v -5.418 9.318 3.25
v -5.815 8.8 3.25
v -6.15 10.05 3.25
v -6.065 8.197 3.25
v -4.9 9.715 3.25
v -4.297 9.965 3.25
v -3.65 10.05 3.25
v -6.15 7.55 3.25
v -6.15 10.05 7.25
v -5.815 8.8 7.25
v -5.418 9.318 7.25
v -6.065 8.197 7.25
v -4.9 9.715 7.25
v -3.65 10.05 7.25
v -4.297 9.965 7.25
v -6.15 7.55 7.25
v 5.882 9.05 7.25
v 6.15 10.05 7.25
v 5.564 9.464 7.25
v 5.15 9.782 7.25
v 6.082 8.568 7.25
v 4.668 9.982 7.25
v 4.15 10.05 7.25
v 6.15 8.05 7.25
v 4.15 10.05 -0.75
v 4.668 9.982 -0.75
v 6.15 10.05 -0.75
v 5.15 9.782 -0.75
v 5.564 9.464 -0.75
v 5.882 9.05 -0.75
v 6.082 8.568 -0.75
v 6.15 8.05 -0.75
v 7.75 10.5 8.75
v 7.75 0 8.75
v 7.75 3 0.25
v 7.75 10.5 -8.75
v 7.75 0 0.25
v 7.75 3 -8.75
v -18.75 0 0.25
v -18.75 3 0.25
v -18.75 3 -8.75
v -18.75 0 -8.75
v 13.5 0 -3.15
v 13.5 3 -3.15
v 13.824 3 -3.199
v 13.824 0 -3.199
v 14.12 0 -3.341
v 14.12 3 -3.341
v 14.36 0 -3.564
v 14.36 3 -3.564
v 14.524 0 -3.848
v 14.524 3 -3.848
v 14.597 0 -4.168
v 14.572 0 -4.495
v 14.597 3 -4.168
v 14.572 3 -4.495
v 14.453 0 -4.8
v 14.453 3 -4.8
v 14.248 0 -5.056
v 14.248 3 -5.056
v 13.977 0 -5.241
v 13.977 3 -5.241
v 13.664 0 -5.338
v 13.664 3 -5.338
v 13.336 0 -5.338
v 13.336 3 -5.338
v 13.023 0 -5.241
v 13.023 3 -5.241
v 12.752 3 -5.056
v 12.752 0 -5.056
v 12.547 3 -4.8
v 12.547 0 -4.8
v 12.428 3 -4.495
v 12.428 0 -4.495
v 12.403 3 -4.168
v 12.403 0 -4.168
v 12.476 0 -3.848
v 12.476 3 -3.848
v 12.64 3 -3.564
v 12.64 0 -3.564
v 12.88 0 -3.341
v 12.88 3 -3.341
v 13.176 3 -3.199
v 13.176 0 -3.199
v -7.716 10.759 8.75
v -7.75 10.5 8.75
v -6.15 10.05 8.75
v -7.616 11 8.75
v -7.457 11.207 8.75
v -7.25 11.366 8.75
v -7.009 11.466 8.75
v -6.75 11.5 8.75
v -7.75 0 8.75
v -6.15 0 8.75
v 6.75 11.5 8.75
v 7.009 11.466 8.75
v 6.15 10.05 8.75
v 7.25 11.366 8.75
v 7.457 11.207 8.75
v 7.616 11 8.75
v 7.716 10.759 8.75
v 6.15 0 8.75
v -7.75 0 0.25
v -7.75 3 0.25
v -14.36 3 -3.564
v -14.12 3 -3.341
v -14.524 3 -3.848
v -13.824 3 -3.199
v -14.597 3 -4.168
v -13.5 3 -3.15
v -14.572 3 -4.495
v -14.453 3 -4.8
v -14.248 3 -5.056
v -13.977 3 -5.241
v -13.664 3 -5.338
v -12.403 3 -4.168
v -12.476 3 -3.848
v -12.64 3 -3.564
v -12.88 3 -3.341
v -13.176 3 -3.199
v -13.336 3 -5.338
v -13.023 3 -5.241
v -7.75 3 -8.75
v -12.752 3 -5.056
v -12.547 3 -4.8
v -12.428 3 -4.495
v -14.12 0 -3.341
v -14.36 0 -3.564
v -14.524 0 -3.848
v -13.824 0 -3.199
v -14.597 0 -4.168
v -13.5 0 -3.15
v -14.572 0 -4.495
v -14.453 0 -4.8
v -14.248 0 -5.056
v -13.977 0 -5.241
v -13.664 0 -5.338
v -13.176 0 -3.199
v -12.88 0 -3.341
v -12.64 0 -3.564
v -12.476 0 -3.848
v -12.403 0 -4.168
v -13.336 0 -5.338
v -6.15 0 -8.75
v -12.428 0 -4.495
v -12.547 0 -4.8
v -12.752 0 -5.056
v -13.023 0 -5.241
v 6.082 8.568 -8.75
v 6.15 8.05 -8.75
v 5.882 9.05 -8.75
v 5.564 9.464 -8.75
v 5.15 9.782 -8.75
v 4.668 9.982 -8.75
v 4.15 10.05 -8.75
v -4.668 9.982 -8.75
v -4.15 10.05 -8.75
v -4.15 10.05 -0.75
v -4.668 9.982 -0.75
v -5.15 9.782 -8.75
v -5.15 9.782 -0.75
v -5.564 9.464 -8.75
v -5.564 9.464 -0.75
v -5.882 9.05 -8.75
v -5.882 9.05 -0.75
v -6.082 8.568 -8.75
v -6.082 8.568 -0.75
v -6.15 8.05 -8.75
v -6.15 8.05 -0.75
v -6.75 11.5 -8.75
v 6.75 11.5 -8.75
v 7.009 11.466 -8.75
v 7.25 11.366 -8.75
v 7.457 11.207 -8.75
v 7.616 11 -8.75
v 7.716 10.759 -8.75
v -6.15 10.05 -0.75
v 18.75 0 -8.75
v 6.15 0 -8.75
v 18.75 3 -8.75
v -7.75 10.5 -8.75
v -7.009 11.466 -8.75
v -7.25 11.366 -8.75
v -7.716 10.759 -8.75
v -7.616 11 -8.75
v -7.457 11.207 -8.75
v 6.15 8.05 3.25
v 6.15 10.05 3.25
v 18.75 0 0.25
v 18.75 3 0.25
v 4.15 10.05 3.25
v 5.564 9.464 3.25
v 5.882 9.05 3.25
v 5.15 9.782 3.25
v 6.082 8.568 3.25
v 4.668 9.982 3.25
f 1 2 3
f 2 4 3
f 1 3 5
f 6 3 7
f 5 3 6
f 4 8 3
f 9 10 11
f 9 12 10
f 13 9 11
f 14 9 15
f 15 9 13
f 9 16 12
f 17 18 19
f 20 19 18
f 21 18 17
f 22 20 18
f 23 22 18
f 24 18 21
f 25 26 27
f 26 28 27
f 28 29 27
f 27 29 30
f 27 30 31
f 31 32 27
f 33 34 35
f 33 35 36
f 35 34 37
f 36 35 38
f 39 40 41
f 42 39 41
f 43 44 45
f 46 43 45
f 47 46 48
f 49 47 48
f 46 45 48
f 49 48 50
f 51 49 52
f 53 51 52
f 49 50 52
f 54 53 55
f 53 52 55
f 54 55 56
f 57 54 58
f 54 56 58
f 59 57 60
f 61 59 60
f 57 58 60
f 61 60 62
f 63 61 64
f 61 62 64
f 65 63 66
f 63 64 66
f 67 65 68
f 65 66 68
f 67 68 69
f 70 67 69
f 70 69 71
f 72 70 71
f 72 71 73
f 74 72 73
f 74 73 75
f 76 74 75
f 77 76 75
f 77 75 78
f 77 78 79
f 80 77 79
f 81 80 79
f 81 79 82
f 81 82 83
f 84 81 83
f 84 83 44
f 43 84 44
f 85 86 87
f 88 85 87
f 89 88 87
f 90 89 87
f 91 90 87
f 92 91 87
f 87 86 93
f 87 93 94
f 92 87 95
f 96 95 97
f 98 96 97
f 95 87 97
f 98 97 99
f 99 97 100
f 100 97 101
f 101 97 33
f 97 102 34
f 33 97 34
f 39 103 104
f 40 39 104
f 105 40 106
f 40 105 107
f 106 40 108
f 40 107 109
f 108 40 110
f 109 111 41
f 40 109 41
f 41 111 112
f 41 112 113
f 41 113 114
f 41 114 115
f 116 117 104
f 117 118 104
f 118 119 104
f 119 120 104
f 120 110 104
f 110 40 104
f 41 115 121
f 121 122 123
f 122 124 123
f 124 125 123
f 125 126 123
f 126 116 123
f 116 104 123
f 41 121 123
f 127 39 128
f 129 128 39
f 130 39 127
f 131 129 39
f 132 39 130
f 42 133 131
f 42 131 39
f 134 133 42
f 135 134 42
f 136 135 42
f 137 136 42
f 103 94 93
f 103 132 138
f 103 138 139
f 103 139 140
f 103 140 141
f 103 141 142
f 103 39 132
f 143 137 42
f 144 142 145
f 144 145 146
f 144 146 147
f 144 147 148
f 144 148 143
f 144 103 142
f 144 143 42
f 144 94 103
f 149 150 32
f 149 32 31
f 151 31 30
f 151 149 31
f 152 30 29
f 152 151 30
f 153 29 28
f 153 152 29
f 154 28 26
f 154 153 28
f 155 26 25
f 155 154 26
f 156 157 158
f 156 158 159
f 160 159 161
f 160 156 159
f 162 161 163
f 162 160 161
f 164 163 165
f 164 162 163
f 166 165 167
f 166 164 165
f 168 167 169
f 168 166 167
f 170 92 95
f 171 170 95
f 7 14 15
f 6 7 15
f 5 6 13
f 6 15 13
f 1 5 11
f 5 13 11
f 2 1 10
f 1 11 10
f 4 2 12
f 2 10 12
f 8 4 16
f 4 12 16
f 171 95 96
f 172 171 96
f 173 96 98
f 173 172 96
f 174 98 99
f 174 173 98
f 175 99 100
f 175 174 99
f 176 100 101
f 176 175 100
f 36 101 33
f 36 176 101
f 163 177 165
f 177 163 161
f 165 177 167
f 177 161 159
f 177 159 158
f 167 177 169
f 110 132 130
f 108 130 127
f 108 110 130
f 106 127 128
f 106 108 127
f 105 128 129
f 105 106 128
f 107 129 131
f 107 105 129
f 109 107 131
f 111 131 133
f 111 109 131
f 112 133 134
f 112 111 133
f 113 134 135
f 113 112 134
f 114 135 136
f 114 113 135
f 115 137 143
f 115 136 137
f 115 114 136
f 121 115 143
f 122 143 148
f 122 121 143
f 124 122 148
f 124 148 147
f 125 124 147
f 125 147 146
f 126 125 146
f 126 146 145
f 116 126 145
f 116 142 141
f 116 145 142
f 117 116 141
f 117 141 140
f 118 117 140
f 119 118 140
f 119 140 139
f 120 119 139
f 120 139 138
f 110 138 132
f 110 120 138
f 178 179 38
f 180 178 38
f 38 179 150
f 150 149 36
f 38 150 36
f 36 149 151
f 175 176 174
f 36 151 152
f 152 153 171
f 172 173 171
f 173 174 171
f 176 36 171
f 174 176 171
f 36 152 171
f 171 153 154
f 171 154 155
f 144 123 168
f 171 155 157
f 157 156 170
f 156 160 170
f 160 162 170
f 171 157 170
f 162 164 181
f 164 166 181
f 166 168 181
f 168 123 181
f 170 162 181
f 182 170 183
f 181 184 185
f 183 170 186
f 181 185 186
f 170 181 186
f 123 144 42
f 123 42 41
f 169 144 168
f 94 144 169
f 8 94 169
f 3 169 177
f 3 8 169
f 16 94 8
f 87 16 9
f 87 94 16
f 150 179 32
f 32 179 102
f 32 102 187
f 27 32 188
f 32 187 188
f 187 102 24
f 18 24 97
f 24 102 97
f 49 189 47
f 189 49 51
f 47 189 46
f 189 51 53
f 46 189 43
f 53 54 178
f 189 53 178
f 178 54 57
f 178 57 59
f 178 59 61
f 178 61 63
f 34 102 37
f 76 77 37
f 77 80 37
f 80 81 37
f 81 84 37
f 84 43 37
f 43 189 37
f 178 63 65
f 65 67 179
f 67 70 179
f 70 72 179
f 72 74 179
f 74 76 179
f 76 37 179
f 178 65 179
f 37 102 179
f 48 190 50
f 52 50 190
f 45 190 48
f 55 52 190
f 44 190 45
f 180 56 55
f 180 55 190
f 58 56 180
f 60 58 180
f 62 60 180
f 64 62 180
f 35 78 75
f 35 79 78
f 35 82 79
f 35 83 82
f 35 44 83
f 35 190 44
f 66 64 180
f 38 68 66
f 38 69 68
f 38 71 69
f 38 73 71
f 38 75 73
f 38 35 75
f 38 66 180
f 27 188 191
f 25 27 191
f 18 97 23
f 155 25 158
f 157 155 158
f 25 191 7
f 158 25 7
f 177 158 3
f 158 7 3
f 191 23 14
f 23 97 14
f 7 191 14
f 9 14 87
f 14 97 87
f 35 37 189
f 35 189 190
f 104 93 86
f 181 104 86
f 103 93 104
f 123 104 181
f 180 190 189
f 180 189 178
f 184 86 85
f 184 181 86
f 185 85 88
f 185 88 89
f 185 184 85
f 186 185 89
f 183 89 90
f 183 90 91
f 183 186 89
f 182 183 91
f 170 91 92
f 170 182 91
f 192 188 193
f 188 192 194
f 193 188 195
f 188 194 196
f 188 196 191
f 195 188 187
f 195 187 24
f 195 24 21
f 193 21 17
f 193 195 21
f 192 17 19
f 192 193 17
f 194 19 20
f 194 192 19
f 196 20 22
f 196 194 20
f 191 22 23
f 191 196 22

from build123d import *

# Parameters (mm, degrees)
CROQUIS1_W               = 15.5
CROQUIS1_H               = 17.5
SALIENTE_EXTRUIR1_DEPTH  = 11.5
CROQUIS2_W               = 12.3
CROQUIS2_H               = 10.05
CORTAR_EXTRUIR1_DEPTH    = 23.328513161
REDONDEO1_R              = 1
CROQUIS3_W               = 9
CROQUIS3_H               = 3
SALIENTE_EXTRUIR4_DEPTH  = 11
CROQUIS12_R              = 1.1
CORTAR_EXTRUIR7_DEPTH    = 23.369063458
CROQUIS13_W              = 18.078388853
CROQUIS13_H              = 17.5
CORTAR_EXTRUIR8_DEPTH    = 24.672241128
REDONDEO1_OF_SIMETR_A2_R = 1
REDONDEO6_R              = 2
CROQUIS15_W              = 6.15
CROQUIS15_H              = 1.2
CROQUIS15_H_2            = 1
CROQUIS15_H_3            = 1.5
CORTAR_EXTRUIR10_DEPTH   = 10.05
CROQUIS17_W              = 2.5
CROQUIS17_H              = 4
SALIENTE_EXTRUIR6_DEPTH  = 2.5
CROQUIS19_R              = 2.5
CORTAR_EXTRUIR12_DEPTH   = 4
CROQUIS20_W              = 2
CROQUIS20_H              = 1.8
CORTAR_EXTRUIR13_DEPTH   = 7.05


with BuildPart() as part:
    # Croquis1 → Saliente-Extruir1 (new body)
    with BuildSketch(Plane(origin=(0, 0, 0), x_dir=(1, 0, 0), z_dir=(0, 1, 0))):
        Rectangle(CROQUIS1_W, CROQUIS1_H)
    saliente_extruir1 = extrude(amount=SALIENTE_EXTRUIR1_DEPTH)

    # Croquis2 → Cortar-Extruir1 (cut, through all)
    with BuildSketch(Plane.XY.offset(8.75)):
        with Locations((0, 5.025)):
            Rectangle(CROQUIS2_W, CROQUIS2_H)
    cortar_extruir1 = extrude(amount=-CORTAR_EXTRUIR1_DEPTH, mode=Mode.SUBTRACT)

    # Redondeo1
    redondeo1_edges = [part.edges().sort_by_distance(p)[0] for p in [
        (7.75, 11.5, 0),
        (-7.75, 11.5, 0),
    ]]
    fillet(redondeo1_edges, radius=REDONDEO1_R)

    # Croquis13 → Cortar-Extruir8 (cut, through all)
    with BuildSketch(Plane(origin=(0, 11.5, 0), x_dir=(1, 0, 0), z_dir=(0, 1, 0))):
        with Locations((-9.039194426, 0)):
            Rectangle(CROQUIS13_W, CROQUIS13_H)
    extrude(amount=-CORTAR_EXTRUIR8_DEPTH, mode=Mode.SUBTRACT)

    # Simetría2: Saliente-Extruir1 across plane
    add(saliente_extruir1.mirror(Plane(origin=(0, 0, -8.75), x_dir=(0, 0, 1), z_dir=(1, 0, 0))))

    # Simetr_a2 2: Cortar-Extruir1 across plane
    add(cortar_extruir1.mirror(Plane(origin=(0, 0, -8.75), x_dir=(0, 0, 1), z_dir=(1, 0, 0))), mode=Mode.SUBTRACT)


with BuildPart() as body_2:
    # Croquis3 → Saliente-Extruir4 (new body)
    with BuildSketch(Plane(origin=(7.75, 0, 0), x_dir=(0, 0, -1), z_dir=(1, 0, 0))):
        with Locations((4.25, 1.5)):
            Rectangle(CROQUIS3_W, CROQUIS3_H)
    saliente_extruir4 = extrude(amount=SALIENTE_EXTRUIR4_DEPTH)

    # Croquis12 → Cortar-Extruir7 (cut, through all)
    with BuildSketch(Plane(origin=(0, 3, 0), x_dir=(1, 0, 0), z_dir=(0, 1, 0))):
        with Locations(Location((13.5, 4.25, 0), (0, 0, 270))):
            Circle(CROQUIS12_R)
    cortar_extruir7 = extrude(amount=-CORTAR_EXTRUIR7_DEPTH, mode=Mode.SUBTRACT)


with BuildPart() as part_1:
    add(part.part)

    # Simetr_a2 3: Saliente-Extruir4 across plane
    add(saliente_extruir4.mirror(Plane(origin=(0, 0, -8.75), x_dir=(0, 0, 1), z_dir=(1, 0, 0))))

    # Simetr_a2 4: Cortar-Extruir7 across plane
    add(cortar_extruir7.mirror(Plane(origin=(0, 0, -8.75), x_dir=(0, 0, 1), z_dir=(1, 0, 0))), mode=Mode.SUBTRACT)

    # Redondeo1 of Simetría2
    redondeo1_of_simetr_a2_edges = [part_1.edges().sort_by_distance(p)[0] for p in [
        (-7.75, 11.5, 0),
        (7.75, 11.5, 0),
    ]]
    fillet(redondeo1_of_simetr_a2_edges, radius=REDONDEO1_OF_SIMETR_A2_R)

    # Combinar3: union body 2
    add(body_2.part)

    # Redondeo6
    redondeo6_edges = [part_1.edges().sort_by_distance(p)[0] for p in [
        (6.15, 10.05, 0),
        (-6.15, 10.05, 0),
    ]]
    fillet(redondeo6_edges, radius=REDONDEO6_R)

    # Croquis15 → Cortar-Extruir10 (cut)
    with BuildSketch(Plane(origin=(0, 0, 0), x_dir=(-1, 0, 0), z_dir=(0, -1, 0))):
        with Locations((-3.075, 0.15)):
            Rectangle(CROQUIS15_W, CROQUIS15_H)
        with Locations((-3.075, -2.75)):
            Rectangle(CROQUIS15_W, CROQUIS15_H_2)
        with Locations((-3.075, -8)):
            Rectangle(CROQUIS15_W, CROQUIS15_H_3)
        Polygon((6.15, 0.75), (0, 0.75), (0, -0.45), (0, -2.25), (0, -3.25), (0, -7.25), (0, -8.75), (6.15, -8.75), align=None)
    extrude(amount=-CORTAR_EXTRUIR10_DEPTH, mode=Mode.SUBTRACT)

    # Croquis17 → Saliente-Extruir6 (add)
    with BuildSketch(Plane.XZ.offset(-10.05)):
        with Locations((-4.9, 5.25)):
            Rectangle(CROQUIS17_W, CROQUIS17_H)
    extrude(amount=SALIENTE_EXTRUIR6_DEPTH)

    # Croquis19 → Cortar-Extruir12 (cut)
    with BuildSketch(Plane.XY.offset(7.25)):
        with Locations((-3.65, 7.55)):
            Circle(CROQUIS19_R)
    extrude(amount=-CORTAR_EXTRUIR12_DEPTH, mode=Mode.SUBTRACT)

    # Croquis20 → Cortar-Extruir13 (cut)
    with BuildSketch(Plane.XZ.offset(-10.05)):
        with Locations((5.15, 1.35)):
            Rectangle(CROQUIS20_W, CROQUIS20_H)
    extrude(amount=CORTAR_EXTRUIR13_DEPTH, mode=Mode.SUBTRACT)


solid = part_1.part
